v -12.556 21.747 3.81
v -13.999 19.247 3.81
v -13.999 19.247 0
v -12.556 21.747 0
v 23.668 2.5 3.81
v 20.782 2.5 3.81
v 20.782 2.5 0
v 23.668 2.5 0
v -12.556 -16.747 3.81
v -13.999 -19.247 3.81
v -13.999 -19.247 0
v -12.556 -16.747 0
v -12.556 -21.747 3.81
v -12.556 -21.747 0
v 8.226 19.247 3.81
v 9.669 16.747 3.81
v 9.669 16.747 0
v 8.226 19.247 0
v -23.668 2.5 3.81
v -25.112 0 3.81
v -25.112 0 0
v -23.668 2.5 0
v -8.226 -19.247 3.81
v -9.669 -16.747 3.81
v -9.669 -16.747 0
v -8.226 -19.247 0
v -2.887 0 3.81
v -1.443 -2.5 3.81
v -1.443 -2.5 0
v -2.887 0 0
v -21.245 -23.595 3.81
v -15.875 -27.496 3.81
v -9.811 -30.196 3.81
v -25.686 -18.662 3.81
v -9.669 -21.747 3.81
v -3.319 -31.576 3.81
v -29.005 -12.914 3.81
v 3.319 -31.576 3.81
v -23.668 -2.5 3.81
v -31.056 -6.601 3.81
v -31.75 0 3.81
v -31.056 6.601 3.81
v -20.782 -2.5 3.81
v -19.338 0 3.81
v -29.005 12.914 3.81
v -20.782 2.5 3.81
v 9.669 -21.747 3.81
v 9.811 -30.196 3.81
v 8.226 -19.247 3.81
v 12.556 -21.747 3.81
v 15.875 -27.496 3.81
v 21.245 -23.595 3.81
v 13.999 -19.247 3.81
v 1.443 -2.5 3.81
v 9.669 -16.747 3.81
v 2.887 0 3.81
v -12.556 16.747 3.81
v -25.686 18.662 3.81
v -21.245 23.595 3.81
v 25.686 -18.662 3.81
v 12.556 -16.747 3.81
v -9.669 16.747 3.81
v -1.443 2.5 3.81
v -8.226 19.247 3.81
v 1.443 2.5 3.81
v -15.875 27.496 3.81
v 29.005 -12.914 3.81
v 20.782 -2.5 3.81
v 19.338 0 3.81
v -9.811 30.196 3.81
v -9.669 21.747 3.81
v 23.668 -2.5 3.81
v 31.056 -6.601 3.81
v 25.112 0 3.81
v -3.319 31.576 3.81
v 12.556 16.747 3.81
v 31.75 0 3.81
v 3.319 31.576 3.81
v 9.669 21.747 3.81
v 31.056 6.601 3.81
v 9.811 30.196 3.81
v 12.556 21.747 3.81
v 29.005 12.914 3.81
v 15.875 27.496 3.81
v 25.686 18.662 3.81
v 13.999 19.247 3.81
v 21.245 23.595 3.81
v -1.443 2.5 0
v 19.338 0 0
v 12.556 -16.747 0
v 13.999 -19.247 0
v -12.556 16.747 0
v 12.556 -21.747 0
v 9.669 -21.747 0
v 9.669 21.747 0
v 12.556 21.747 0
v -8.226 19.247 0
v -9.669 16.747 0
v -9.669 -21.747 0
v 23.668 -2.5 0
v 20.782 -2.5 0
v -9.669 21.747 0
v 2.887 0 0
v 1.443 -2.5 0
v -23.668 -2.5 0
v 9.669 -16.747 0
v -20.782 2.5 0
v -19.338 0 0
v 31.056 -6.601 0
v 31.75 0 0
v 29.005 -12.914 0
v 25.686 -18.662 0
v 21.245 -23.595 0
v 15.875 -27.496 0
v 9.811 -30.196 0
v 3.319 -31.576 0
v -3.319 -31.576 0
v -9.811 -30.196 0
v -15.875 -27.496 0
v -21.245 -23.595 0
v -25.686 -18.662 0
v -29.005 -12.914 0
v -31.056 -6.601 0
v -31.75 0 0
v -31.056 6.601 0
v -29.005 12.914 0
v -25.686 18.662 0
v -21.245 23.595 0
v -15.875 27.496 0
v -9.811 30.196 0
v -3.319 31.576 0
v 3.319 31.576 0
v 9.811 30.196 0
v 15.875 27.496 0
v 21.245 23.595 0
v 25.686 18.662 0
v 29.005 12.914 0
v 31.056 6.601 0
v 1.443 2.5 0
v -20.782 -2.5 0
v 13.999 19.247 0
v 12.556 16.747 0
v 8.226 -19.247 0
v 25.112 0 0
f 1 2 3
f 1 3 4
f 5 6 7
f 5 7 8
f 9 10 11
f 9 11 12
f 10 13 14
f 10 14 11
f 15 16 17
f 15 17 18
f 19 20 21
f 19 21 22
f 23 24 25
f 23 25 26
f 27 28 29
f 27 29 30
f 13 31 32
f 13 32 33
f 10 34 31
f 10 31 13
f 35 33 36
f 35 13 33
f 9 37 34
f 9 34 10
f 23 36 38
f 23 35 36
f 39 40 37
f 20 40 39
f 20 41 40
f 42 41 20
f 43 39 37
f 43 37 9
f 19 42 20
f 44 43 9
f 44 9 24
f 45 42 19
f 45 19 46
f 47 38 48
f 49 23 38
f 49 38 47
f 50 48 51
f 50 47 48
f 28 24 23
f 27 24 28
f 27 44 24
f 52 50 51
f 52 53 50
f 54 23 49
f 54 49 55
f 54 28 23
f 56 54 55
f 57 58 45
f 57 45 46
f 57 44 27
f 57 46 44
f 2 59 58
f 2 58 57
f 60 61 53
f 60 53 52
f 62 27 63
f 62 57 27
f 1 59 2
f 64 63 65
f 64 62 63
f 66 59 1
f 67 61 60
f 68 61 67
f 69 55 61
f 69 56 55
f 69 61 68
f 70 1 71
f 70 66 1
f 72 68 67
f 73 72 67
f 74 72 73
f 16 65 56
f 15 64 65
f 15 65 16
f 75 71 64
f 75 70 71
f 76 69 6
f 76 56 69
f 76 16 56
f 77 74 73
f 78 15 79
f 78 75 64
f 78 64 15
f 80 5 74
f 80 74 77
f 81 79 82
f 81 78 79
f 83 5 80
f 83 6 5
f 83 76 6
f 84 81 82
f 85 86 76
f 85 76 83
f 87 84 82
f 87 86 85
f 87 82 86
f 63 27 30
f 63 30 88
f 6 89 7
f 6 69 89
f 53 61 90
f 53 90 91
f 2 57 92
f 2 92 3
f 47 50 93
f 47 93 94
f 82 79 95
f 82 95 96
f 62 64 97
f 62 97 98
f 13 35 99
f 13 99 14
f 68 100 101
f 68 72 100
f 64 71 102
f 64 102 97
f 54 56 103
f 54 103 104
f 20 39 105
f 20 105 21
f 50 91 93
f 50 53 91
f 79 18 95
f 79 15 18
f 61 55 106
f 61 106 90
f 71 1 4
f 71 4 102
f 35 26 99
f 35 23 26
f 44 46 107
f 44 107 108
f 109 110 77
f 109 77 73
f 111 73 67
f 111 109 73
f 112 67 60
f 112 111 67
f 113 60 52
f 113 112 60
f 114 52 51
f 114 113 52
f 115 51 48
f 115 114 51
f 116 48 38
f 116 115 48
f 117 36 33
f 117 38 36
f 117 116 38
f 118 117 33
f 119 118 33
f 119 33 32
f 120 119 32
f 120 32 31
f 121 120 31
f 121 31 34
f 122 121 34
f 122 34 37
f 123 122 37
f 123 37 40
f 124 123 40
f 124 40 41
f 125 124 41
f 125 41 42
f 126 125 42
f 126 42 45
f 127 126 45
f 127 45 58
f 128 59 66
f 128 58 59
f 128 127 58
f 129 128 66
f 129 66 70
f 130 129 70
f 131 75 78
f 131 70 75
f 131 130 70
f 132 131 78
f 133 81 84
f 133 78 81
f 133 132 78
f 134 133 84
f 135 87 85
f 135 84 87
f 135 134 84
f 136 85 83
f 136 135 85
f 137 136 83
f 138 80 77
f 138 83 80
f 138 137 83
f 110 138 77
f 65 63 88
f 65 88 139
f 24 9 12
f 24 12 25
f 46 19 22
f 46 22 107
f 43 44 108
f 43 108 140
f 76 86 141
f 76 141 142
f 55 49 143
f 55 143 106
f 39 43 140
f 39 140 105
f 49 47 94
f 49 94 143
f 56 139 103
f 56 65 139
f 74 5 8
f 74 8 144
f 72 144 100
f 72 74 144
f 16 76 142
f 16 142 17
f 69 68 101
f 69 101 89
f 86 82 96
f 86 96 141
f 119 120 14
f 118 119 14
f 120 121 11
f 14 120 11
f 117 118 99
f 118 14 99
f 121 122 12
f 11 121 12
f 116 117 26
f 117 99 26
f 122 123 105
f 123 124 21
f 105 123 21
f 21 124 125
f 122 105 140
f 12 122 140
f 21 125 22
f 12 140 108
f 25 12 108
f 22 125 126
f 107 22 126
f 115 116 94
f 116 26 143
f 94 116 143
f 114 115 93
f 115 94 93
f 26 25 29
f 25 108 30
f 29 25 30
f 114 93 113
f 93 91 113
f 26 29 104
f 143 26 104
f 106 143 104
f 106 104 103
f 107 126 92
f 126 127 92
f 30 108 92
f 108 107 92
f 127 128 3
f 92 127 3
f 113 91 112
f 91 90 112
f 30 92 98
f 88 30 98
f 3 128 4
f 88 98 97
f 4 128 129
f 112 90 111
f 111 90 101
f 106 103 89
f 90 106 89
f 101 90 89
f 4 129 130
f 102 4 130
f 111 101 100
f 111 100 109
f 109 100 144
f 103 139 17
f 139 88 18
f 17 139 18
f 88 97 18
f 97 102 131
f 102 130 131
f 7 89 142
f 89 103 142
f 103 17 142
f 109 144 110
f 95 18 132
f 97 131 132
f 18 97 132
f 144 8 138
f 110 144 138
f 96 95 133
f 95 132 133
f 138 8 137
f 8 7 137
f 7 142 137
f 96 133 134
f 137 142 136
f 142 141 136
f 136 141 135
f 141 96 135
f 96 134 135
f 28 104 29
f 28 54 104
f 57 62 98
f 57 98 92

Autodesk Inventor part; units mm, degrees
ref_plane "YZ Plane" through (0, 0, 0) normal (1, 0, 0) x (0, 1, 0)
ref_plane "XZ Plane" through (0, 0, 0) normal (0, 1, 0) x (-1, 0, 0)
ref_plane "XY Plane" through (0, 0, 0) normal (0, 0, 1) x (1, 0, 0)
sketch "Sketch1" plane through (0, 0, 0) normal (0, 0, 1) x (1, 0, 0)
  circle A0 centre (0, 0) radius 31.75
  dimension "d0" = 63.5
extrude "Extrusion1" add sketch "Sketch1" along normal blind 3.81
sketch "Sketch2" plane through (0, 0, 3.81) normal (0, 0, 1) x (1, 0, 0)
  line L0 (-11.1125, 19.2474) -> (11.1125, 19.2474)
  line L1 (11.1125, 19.2474) -> (22.225, 0)
  line L2 (22.225, 0) -> (11.1125, -19.2474)
  line L3 (11.1125, -19.2474) -> (-11.1125, -19.2474)
  line L4 (-11.1125, -19.2474) -> (-22.225, 0)
  line L5 (-22.225, 0) -> (-11.1125, 19.2474)
  line L6 (-12.5559, 21.7474) -> (-9.6691, 21.7474)
  line L7 (-9.6691, 21.7474) -> (-8.2257, 19.2474)
  line L8 (-8.2257, 19.2474) -> (-9.6691, 16.7474)
  line L9 (-9.6691, 16.7474) -> (-12.5559, 16.7474)
  line L10 (-12.5559, 16.7474) -> (-13.9993, 19.2474)
  line L11 (-13.9993, 19.2474) -> (-12.5559, 21.7474)
  line L12 (-23.6684, -2.5) -> (-25.1118, 0)
  line L13 (-25.1118, 0) -> (-23.6684, 2.5)
  line L14 (-23.6684, 2.5) -> (-20.7816, 2.5)
  line L15 (-20.7816, 2.5) -> (-19.3382, 0)
  line L16 (-19.3382, 0) -> (-20.7816, -2.5)
  line L17 (-20.7816, -2.5) -> (-23.6684, -2.5)
  line L18 (-9.6691, -21.7474) -> (-12.5559, -21.7474)
  line L19 (-12.5559, -21.7474) -> (-13.9993, -19.2474)
  line L20 (-13.9993, -19.2474) -> (-12.5559, -16.7474)
  line L21 (-12.5559, -16.7474) -> (-9.6691, -16.7474)
  line L22 (-9.6691, -16.7474) -> (-8.2257, -19.2474)
  line L23 (-8.2257, -19.2474) -> (-9.6691, -21.7474)
  line L24 (13.9993, -19.2474) -> (12.5559, -21.7474)
  line L25 (12.5559, -21.7474) -> (9.6691, -21.7474)
  line L26 (9.6691, -21.7474) -> (8.2257, -19.2474)
  line L27 (8.2257, -19.2474) -> (9.6691, -16.7474)
  line L28 (9.6691, -16.7474) -> (12.5559, -16.7474)
  line L29 (12.5559, -16.7474) -> (13.9993, -19.2474)
  line L30 (23.6684, 2.5) -> (25.1118, 0)
  line L31 (25.1118, 0) -> (23.6684, -2.5)
  line L32 (23.6684, -2.5) -> (20.7816, -2.5)
  line L33 (20.7816, -2.5) -> (19.3382, 0)
  line L34 (19.3382, 0) -> (20.7816, 2.5)
  line L35 (20.7816, 2.5) -> (23.6684, 2.5)
  line L36 (9.6691, 21.7474) -> (12.5559, 21.7474)
  line L37 (12.5559, 21.7474) -> (13.9993, 19.2474)
  line L38 (13.9993, 19.2474) -> (12.5559, 16.7474)
  line L39 (12.5559, 16.7474) -> (9.6691, 16.7474)
  line L40 (9.6691, 16.7474) -> (8.2257, 19.2474)
  line L41 (8.2257, 19.2474) -> (9.6691, 21.7474)
  point P0 (0, 0)
  point P1 (0, 0)
  point P2 (0, 0)
  dimension "d15" = 5
  dimension "d18" = 360
  dimension "d20" = 22.225
extrude "Extrusion2" cut sketch "Sketch2" against normal blind 3.81 contours L5 L10 L11 L6 L7 L0 | L0 L8 L9 L5 | L41 L36 L37 L38 L1 L0 | L0 L1 L39 L40 | L15 L16 L4 L5 | L5 L4 L17 L12 L13 L14 | L35 L30 L31 L32 L2 L1 | L1 L2 L33 L34 | L21 L22 L3 L4 | L4 L3 L23 L18 L19 L20 | L29 L24 L25 L26 L3 L2 | L2 L3 L27 L28
sketch "Sketch3" plane through (0, 0, 3.81) normal (0, 0, 1) x (1, 0, 0)
  circle A0 centre (0, 0) radius 31.75 projected
  line L0 (-2.8868, 0) -> (-1.4434, 2.5)
  line L1 (-1.4434, 2.5) -> (1.4434, 2.5)
  line L2 (1.4434, 2.5) -> (2.8868, 0)
  line L3 (2.8868, 0) -> (1.4434, -2.5)
  line L4 (1.4434, -2.5) -> (-1.4434, -2.5)
  line L5 (-1.4434, -2.5) -> (-2.8868, 0)
  dimension "d14" = 5
extrude "Extrusion3" cut sketch "Sketch3" against normal blind 3.81 contours L0 L1 L2 L3 L4 L5
properties part number "Input _Ring"
